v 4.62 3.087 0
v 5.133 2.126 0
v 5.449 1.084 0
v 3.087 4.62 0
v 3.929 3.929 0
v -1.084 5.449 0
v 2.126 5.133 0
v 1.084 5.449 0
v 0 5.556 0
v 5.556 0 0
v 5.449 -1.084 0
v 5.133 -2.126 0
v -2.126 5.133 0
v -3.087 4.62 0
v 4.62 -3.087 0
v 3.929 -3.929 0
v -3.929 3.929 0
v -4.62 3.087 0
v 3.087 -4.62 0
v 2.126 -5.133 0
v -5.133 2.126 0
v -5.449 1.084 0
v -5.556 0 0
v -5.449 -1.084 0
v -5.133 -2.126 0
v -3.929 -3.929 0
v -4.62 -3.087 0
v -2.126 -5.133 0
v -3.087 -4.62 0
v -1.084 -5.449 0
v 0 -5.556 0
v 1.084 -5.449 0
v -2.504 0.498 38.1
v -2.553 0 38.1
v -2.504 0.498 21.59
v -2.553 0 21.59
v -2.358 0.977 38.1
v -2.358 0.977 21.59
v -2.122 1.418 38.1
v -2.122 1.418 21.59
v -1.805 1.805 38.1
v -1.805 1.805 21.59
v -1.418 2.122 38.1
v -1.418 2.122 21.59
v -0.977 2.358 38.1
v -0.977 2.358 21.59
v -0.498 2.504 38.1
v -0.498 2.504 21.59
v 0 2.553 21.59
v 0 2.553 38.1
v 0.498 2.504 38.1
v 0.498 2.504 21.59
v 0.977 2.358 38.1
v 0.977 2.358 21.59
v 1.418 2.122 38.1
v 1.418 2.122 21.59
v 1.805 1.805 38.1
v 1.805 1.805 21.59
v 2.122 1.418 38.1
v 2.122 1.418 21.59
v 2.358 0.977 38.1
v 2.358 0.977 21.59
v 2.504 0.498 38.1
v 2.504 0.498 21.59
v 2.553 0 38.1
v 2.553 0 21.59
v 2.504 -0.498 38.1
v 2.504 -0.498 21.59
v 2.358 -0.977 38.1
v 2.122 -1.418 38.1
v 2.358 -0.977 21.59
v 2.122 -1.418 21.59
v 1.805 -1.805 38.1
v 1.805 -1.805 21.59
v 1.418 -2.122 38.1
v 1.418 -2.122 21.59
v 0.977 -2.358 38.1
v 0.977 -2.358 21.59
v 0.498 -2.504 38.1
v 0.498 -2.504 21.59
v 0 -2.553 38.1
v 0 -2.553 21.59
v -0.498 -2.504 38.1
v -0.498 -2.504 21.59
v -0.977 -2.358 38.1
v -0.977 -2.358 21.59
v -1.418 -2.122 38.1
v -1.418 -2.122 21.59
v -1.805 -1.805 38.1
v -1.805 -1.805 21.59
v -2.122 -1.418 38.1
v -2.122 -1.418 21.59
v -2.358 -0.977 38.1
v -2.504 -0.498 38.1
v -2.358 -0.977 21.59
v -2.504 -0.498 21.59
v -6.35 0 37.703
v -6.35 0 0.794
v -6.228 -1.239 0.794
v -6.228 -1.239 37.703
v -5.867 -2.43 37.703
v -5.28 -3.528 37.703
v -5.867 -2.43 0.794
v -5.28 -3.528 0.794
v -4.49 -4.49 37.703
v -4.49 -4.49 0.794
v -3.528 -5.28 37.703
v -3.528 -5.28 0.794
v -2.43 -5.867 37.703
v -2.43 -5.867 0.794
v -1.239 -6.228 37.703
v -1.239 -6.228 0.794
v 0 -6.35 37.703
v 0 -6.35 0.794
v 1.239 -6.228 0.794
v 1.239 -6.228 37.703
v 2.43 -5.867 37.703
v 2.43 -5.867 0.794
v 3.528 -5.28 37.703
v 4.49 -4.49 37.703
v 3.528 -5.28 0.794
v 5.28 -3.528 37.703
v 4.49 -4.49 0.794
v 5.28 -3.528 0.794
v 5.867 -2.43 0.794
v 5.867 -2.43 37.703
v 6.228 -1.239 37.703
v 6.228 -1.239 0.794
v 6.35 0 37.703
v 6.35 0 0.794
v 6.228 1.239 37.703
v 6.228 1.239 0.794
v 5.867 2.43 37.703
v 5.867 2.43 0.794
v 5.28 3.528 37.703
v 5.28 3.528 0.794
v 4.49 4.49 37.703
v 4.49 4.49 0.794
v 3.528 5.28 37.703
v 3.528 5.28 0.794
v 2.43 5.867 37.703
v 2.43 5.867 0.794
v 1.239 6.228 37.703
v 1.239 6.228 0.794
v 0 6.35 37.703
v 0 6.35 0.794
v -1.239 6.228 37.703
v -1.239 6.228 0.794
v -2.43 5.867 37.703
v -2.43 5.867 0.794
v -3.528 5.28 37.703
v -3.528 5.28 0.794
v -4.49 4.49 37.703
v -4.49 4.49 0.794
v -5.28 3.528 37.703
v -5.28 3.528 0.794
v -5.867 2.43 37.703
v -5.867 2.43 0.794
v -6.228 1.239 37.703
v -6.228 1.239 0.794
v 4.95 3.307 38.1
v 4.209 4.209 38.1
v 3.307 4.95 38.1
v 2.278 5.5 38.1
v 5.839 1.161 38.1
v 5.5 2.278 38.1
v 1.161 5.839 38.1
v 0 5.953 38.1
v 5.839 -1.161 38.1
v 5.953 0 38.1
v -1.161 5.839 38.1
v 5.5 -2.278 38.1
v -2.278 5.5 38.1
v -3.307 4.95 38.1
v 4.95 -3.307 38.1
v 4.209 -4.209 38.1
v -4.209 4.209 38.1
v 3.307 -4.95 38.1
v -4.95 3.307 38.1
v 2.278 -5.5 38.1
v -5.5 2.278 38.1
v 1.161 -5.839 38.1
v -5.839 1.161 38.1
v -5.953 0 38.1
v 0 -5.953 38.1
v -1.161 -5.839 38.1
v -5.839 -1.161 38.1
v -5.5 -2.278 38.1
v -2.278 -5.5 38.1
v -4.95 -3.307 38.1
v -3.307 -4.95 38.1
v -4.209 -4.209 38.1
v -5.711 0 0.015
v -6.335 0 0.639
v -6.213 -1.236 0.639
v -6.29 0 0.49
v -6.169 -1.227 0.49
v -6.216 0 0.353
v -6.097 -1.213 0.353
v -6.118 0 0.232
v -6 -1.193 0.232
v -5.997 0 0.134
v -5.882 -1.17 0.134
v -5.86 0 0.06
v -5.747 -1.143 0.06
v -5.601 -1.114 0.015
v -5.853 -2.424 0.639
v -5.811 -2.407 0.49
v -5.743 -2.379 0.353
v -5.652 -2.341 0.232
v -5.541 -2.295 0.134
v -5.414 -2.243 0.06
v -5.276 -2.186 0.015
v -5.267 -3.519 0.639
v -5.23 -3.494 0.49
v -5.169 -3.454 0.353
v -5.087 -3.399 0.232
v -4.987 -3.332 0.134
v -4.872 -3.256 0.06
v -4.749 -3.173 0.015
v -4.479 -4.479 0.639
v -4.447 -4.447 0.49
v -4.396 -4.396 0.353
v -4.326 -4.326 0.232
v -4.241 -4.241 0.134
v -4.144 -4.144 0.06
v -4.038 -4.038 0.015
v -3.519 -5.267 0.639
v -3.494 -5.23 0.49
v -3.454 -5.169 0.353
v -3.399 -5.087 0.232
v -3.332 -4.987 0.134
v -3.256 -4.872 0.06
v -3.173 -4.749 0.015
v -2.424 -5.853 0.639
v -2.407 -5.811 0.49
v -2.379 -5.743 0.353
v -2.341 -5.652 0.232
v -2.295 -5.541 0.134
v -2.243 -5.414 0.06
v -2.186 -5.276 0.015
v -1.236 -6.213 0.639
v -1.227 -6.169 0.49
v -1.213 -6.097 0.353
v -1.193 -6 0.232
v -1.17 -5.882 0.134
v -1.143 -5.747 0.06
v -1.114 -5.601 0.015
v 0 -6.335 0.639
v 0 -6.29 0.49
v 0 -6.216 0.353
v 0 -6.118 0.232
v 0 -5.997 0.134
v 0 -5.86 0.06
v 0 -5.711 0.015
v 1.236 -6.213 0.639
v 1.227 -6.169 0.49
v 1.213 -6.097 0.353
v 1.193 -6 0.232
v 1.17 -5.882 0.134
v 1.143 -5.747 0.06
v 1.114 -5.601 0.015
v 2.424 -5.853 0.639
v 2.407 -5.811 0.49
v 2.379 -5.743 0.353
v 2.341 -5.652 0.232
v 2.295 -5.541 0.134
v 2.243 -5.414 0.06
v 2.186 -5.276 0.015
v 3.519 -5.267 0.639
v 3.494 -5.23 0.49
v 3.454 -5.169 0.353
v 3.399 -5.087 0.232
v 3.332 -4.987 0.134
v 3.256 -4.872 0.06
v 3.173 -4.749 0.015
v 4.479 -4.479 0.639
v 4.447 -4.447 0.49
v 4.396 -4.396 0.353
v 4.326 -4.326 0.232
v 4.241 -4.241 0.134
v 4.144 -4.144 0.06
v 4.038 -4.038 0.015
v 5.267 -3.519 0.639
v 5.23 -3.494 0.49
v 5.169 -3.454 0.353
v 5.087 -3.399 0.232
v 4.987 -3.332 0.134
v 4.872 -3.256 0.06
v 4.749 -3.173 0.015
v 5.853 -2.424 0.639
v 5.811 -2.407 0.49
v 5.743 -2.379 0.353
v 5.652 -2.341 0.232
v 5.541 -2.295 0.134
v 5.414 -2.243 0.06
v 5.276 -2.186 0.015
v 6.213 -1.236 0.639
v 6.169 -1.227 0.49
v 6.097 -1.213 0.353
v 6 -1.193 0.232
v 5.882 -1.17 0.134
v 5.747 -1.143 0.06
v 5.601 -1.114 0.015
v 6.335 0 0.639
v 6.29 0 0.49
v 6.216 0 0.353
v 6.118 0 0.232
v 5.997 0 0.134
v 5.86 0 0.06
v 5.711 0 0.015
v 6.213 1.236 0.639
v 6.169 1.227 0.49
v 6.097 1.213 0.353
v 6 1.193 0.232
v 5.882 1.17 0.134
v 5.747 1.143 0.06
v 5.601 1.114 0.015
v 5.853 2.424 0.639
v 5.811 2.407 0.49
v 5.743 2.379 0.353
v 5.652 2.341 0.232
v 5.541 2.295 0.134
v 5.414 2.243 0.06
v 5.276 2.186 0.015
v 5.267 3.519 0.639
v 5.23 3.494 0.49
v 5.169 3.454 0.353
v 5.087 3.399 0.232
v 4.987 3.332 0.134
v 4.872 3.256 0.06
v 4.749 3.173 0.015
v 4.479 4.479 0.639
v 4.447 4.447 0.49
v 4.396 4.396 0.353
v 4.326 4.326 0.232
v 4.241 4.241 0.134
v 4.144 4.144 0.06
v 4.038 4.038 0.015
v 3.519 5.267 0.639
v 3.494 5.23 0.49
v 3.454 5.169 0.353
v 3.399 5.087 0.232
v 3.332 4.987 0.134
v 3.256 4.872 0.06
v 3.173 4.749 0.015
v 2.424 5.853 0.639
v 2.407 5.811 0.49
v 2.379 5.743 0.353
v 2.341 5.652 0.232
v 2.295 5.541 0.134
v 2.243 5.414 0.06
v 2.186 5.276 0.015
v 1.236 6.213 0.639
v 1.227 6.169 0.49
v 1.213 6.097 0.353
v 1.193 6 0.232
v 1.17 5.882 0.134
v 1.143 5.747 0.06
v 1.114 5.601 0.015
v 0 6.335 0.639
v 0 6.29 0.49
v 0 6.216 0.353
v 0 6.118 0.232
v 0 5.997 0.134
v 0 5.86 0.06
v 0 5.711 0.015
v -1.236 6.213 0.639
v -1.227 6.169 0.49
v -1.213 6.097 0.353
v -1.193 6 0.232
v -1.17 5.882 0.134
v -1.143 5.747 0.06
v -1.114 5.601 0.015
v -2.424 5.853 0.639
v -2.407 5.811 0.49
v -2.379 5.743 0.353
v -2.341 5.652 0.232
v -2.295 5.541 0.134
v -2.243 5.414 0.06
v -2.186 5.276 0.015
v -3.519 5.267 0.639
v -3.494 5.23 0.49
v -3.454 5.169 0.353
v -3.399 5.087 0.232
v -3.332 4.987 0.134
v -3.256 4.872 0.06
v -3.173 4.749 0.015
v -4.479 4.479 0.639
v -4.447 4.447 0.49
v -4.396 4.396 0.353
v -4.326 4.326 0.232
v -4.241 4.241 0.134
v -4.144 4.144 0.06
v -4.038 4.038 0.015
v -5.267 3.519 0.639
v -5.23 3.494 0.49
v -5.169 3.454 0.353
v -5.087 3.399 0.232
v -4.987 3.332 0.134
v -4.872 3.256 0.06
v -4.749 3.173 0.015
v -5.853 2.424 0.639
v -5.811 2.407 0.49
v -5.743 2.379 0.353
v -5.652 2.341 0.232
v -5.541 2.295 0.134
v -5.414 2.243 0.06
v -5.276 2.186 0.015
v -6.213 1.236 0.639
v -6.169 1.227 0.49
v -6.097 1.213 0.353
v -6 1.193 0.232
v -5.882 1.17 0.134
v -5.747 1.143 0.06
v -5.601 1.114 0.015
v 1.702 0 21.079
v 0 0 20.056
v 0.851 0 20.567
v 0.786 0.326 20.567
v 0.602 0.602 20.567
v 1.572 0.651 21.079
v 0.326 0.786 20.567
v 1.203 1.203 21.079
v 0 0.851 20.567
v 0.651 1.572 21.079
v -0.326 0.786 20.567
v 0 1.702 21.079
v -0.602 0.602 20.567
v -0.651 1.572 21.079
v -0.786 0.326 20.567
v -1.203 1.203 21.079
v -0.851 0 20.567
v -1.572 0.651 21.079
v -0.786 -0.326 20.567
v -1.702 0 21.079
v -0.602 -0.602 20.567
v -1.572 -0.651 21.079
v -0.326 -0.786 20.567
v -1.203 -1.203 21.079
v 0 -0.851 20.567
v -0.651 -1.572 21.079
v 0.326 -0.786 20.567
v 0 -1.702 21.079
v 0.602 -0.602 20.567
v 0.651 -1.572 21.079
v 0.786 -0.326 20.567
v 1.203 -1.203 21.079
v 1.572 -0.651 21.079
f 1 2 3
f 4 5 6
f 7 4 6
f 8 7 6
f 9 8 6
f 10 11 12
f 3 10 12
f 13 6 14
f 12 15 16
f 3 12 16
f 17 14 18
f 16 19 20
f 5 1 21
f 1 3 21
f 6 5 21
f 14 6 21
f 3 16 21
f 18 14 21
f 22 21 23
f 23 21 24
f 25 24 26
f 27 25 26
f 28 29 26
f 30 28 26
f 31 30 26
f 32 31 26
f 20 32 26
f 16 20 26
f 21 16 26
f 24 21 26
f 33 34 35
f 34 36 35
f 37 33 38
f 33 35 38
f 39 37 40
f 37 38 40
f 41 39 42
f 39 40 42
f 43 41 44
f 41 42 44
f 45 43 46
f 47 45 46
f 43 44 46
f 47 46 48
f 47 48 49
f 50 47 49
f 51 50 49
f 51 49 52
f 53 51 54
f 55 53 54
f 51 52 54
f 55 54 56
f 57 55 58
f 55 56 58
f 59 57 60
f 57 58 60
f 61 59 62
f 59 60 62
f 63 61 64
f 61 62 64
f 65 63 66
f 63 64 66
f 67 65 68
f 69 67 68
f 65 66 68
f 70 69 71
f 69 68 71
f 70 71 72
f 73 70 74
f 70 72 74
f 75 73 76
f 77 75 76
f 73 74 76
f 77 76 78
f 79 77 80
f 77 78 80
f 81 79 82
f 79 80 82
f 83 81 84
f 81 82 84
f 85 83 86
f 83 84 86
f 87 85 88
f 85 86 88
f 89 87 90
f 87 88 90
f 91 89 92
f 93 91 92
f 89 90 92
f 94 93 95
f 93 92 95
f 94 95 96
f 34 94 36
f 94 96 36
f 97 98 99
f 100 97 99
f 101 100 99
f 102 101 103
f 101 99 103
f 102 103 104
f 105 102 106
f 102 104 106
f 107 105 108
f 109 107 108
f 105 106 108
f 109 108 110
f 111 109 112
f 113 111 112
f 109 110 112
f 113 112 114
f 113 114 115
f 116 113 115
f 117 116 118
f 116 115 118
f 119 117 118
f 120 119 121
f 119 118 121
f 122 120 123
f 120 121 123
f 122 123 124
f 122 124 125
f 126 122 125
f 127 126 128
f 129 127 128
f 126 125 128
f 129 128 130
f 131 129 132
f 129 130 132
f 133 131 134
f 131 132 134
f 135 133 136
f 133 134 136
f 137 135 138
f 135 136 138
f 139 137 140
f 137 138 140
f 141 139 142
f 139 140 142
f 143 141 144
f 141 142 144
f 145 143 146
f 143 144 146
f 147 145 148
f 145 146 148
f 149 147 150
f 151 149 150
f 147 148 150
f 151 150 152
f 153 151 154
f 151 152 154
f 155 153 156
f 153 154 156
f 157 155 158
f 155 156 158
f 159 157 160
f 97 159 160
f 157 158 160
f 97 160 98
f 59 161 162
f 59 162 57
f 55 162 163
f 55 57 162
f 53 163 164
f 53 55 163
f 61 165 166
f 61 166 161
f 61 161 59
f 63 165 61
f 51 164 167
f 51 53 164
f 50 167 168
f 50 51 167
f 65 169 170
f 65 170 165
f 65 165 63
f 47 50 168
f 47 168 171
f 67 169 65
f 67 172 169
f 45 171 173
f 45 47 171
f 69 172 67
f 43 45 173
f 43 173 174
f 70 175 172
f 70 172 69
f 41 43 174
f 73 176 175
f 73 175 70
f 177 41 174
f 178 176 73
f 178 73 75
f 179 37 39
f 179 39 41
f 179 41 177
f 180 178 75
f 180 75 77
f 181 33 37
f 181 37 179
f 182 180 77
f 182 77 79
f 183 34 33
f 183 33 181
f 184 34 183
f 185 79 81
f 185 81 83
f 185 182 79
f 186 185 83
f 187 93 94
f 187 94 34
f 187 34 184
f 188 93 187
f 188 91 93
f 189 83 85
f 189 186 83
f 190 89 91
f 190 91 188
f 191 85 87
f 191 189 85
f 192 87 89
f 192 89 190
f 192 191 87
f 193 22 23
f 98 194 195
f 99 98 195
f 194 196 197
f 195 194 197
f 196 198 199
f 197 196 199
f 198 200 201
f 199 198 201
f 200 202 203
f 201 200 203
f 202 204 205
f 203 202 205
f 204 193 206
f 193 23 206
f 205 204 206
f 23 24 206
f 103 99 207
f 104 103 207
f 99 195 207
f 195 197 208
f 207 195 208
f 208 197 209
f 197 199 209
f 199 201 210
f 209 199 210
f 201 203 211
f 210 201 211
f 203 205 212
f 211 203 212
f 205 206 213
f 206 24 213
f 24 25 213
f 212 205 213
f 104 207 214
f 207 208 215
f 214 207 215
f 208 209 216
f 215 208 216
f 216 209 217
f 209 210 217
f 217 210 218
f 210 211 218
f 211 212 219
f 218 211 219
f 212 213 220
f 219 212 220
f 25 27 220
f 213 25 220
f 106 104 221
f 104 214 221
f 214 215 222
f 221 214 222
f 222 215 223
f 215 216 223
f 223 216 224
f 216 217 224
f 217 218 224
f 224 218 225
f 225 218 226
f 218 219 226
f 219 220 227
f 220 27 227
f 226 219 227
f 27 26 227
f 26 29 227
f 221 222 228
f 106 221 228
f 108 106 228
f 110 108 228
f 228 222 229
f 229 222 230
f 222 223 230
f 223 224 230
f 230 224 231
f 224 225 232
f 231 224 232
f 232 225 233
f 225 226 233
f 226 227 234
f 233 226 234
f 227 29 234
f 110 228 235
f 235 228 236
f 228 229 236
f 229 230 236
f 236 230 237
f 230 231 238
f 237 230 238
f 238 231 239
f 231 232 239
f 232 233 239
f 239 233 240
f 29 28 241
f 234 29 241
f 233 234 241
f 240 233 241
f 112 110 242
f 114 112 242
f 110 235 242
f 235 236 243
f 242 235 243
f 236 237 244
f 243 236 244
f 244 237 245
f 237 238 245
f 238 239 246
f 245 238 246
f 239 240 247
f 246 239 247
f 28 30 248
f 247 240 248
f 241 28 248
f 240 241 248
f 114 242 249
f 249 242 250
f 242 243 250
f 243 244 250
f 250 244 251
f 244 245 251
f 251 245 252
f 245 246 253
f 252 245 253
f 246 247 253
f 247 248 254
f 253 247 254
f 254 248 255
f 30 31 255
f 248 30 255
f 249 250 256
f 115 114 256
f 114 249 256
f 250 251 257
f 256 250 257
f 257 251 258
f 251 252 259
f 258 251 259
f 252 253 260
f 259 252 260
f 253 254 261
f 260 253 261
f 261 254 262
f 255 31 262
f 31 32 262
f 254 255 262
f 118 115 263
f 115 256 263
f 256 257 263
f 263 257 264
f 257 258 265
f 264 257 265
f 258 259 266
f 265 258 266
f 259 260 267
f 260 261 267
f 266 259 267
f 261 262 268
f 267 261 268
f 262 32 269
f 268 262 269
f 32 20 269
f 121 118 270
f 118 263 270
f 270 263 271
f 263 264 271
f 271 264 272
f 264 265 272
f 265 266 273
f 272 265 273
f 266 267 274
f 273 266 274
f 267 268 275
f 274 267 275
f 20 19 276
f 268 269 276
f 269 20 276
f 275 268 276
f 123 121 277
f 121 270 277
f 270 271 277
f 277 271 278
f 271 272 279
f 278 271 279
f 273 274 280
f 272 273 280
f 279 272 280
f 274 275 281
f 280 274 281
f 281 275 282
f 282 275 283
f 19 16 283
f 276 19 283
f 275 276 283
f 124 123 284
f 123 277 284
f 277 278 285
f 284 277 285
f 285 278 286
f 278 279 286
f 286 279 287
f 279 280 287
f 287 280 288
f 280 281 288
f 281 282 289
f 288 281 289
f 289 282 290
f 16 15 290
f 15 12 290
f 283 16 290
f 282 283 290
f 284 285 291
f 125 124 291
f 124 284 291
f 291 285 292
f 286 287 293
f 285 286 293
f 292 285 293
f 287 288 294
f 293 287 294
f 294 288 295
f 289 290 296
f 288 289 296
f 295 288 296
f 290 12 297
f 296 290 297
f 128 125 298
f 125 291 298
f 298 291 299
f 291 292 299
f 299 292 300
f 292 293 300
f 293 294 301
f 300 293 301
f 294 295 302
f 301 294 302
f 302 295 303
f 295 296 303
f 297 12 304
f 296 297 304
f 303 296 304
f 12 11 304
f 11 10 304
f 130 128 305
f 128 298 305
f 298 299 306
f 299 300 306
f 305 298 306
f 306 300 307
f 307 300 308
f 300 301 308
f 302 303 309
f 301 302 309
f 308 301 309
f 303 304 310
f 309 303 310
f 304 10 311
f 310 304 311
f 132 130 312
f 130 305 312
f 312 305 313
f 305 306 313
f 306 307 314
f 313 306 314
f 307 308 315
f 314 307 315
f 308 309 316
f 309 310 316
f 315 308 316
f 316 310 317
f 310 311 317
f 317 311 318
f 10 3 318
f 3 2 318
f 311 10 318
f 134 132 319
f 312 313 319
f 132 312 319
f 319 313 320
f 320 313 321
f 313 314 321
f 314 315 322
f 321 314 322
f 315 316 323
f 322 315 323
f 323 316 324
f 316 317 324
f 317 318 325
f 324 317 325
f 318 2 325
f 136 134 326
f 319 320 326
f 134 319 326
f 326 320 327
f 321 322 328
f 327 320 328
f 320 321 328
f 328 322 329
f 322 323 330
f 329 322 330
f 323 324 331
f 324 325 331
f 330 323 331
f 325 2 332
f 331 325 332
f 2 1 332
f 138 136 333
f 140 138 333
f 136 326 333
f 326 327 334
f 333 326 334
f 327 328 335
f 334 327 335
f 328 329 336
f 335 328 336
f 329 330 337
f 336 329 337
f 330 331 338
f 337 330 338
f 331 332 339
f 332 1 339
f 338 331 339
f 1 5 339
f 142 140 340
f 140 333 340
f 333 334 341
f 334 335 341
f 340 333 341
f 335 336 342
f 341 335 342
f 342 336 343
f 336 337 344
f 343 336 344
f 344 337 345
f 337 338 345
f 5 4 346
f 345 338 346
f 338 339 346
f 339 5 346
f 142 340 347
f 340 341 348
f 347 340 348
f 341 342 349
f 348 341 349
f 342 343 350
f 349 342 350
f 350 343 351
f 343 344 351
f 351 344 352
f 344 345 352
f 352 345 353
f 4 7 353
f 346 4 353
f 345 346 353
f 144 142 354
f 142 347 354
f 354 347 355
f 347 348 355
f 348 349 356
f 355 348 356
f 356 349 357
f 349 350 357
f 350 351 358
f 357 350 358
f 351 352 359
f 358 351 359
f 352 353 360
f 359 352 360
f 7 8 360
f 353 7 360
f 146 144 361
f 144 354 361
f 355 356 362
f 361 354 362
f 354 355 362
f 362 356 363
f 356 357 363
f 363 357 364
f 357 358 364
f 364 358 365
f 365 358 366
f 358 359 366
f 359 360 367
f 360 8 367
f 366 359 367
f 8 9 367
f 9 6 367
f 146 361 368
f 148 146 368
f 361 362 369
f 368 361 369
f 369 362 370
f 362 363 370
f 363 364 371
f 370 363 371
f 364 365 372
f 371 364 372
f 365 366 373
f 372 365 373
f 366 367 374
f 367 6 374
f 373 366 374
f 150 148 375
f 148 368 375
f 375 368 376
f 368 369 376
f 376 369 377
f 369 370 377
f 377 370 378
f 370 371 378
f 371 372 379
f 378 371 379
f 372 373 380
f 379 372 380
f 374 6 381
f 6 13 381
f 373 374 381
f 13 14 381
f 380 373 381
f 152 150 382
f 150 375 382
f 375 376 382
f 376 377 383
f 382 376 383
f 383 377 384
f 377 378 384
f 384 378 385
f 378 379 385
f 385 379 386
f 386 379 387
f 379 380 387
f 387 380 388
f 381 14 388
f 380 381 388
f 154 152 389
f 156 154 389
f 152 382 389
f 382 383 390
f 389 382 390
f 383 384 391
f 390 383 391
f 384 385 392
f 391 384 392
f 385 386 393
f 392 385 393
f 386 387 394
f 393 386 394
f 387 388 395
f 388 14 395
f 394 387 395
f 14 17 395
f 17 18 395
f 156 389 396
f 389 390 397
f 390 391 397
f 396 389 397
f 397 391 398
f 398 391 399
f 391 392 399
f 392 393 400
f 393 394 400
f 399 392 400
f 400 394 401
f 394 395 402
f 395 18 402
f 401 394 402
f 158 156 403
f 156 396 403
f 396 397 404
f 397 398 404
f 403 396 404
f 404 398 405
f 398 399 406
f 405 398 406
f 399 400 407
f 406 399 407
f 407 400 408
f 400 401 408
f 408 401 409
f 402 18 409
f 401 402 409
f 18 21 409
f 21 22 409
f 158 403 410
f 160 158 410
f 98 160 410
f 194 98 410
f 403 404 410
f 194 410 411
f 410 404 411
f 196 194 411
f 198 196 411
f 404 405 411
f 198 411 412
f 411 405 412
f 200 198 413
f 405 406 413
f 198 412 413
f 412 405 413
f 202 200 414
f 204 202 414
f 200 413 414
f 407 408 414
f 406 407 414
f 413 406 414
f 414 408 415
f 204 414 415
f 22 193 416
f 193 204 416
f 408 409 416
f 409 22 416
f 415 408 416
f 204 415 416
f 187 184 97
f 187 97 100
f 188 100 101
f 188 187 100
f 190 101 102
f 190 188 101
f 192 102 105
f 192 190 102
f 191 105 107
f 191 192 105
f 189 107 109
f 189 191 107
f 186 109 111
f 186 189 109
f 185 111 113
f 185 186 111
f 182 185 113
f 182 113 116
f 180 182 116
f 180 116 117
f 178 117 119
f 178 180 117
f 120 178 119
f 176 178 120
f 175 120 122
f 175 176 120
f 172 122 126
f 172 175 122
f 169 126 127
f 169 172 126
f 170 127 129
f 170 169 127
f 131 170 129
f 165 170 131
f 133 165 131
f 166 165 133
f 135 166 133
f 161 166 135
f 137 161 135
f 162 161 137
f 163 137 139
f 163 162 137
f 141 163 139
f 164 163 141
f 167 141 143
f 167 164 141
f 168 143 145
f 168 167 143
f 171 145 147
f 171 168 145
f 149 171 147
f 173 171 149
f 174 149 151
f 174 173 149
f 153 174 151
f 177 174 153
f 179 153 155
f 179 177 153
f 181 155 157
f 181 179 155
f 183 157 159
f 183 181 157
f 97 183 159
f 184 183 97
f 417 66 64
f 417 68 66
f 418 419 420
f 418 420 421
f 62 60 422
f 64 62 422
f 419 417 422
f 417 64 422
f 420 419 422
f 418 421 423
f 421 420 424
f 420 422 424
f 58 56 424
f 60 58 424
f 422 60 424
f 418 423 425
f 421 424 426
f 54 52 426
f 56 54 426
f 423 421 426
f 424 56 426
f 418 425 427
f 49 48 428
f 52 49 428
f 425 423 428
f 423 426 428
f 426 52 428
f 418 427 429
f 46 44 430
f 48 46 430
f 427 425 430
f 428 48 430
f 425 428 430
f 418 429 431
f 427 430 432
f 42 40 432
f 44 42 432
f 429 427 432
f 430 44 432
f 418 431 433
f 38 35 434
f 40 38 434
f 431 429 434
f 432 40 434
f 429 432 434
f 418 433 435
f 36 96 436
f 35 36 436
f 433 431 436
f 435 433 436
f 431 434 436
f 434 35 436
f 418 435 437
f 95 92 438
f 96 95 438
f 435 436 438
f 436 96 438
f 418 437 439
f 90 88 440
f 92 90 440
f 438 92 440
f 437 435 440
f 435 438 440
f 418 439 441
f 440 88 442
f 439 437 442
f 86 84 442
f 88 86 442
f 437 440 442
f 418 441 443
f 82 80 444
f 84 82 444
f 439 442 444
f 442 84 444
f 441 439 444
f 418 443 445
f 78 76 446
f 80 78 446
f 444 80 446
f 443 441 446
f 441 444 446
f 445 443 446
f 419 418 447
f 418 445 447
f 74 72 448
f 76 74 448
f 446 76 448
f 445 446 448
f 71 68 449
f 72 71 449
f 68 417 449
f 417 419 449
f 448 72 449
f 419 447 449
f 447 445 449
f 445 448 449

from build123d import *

# Parameters (mm, degrees)
SKETCH1_R                   = 6.35
EXTRUDE1_DEPTH              = 38.1
F_1_4_20_TAPPED_HOLE1_D     = 5.1054
F_1_4_20_TAPPED_HOLE1_DEPTH = 16.51
F_1_4_20_TAPPED_HOLE1_TIP   = 1.533816902
CHAMFER1_SIZE               = 0.396875
FILLET1_R                   = 0.79375


with BuildPart() as part:
    # Sketch1 → Extrude1 (new body)
    with BuildSketch(Plane.XY):
        with Locations(Location((0, 0, 0), (0, 0, 180))):
            Circle(SKETCH1_R)
    extrude(amount=EXTRUDE1_DEPTH)

    # 1/4-20 Tapped Hole1
    with Locations(Plane.XY.offset(38.1)):
        with Locations((0, 0)):
            Hole(F_1_4_20_TAPPED_HOLE1_D / 2, depth=F_1_4_20_TAPPED_HOLE1_DEPTH)
            with Locations((0, 0, -(F_1_4_20_TAPPED_HOLE1_DEPTH + F_1_4_20_TAPPED_HOLE1_TIP / 2))):  # 118° drill point
                Cone(0, F_1_4_20_TAPPED_HOLE1_D / 2, F_1_4_20_TAPPED_HOLE1_TIP, mode=Mode.SUBTRACT)

    # Chamfer1
    chamfer1_edges = [part.edges().sort_by_distance(p)[0] for p in [
        (6.35, 0, 38.1),
    ]]
    chamfer(chamfer1_edges, length=CHAMFER1_SIZE)

    # Fillet1
    fillet1_edges = [part.edges().sort_by_distance(p)[0] for p in [
        (6.35, 0, 0),
    ]]
    fillet(fillet1_edges, radius=FILLET1_R)


solid = part.part
